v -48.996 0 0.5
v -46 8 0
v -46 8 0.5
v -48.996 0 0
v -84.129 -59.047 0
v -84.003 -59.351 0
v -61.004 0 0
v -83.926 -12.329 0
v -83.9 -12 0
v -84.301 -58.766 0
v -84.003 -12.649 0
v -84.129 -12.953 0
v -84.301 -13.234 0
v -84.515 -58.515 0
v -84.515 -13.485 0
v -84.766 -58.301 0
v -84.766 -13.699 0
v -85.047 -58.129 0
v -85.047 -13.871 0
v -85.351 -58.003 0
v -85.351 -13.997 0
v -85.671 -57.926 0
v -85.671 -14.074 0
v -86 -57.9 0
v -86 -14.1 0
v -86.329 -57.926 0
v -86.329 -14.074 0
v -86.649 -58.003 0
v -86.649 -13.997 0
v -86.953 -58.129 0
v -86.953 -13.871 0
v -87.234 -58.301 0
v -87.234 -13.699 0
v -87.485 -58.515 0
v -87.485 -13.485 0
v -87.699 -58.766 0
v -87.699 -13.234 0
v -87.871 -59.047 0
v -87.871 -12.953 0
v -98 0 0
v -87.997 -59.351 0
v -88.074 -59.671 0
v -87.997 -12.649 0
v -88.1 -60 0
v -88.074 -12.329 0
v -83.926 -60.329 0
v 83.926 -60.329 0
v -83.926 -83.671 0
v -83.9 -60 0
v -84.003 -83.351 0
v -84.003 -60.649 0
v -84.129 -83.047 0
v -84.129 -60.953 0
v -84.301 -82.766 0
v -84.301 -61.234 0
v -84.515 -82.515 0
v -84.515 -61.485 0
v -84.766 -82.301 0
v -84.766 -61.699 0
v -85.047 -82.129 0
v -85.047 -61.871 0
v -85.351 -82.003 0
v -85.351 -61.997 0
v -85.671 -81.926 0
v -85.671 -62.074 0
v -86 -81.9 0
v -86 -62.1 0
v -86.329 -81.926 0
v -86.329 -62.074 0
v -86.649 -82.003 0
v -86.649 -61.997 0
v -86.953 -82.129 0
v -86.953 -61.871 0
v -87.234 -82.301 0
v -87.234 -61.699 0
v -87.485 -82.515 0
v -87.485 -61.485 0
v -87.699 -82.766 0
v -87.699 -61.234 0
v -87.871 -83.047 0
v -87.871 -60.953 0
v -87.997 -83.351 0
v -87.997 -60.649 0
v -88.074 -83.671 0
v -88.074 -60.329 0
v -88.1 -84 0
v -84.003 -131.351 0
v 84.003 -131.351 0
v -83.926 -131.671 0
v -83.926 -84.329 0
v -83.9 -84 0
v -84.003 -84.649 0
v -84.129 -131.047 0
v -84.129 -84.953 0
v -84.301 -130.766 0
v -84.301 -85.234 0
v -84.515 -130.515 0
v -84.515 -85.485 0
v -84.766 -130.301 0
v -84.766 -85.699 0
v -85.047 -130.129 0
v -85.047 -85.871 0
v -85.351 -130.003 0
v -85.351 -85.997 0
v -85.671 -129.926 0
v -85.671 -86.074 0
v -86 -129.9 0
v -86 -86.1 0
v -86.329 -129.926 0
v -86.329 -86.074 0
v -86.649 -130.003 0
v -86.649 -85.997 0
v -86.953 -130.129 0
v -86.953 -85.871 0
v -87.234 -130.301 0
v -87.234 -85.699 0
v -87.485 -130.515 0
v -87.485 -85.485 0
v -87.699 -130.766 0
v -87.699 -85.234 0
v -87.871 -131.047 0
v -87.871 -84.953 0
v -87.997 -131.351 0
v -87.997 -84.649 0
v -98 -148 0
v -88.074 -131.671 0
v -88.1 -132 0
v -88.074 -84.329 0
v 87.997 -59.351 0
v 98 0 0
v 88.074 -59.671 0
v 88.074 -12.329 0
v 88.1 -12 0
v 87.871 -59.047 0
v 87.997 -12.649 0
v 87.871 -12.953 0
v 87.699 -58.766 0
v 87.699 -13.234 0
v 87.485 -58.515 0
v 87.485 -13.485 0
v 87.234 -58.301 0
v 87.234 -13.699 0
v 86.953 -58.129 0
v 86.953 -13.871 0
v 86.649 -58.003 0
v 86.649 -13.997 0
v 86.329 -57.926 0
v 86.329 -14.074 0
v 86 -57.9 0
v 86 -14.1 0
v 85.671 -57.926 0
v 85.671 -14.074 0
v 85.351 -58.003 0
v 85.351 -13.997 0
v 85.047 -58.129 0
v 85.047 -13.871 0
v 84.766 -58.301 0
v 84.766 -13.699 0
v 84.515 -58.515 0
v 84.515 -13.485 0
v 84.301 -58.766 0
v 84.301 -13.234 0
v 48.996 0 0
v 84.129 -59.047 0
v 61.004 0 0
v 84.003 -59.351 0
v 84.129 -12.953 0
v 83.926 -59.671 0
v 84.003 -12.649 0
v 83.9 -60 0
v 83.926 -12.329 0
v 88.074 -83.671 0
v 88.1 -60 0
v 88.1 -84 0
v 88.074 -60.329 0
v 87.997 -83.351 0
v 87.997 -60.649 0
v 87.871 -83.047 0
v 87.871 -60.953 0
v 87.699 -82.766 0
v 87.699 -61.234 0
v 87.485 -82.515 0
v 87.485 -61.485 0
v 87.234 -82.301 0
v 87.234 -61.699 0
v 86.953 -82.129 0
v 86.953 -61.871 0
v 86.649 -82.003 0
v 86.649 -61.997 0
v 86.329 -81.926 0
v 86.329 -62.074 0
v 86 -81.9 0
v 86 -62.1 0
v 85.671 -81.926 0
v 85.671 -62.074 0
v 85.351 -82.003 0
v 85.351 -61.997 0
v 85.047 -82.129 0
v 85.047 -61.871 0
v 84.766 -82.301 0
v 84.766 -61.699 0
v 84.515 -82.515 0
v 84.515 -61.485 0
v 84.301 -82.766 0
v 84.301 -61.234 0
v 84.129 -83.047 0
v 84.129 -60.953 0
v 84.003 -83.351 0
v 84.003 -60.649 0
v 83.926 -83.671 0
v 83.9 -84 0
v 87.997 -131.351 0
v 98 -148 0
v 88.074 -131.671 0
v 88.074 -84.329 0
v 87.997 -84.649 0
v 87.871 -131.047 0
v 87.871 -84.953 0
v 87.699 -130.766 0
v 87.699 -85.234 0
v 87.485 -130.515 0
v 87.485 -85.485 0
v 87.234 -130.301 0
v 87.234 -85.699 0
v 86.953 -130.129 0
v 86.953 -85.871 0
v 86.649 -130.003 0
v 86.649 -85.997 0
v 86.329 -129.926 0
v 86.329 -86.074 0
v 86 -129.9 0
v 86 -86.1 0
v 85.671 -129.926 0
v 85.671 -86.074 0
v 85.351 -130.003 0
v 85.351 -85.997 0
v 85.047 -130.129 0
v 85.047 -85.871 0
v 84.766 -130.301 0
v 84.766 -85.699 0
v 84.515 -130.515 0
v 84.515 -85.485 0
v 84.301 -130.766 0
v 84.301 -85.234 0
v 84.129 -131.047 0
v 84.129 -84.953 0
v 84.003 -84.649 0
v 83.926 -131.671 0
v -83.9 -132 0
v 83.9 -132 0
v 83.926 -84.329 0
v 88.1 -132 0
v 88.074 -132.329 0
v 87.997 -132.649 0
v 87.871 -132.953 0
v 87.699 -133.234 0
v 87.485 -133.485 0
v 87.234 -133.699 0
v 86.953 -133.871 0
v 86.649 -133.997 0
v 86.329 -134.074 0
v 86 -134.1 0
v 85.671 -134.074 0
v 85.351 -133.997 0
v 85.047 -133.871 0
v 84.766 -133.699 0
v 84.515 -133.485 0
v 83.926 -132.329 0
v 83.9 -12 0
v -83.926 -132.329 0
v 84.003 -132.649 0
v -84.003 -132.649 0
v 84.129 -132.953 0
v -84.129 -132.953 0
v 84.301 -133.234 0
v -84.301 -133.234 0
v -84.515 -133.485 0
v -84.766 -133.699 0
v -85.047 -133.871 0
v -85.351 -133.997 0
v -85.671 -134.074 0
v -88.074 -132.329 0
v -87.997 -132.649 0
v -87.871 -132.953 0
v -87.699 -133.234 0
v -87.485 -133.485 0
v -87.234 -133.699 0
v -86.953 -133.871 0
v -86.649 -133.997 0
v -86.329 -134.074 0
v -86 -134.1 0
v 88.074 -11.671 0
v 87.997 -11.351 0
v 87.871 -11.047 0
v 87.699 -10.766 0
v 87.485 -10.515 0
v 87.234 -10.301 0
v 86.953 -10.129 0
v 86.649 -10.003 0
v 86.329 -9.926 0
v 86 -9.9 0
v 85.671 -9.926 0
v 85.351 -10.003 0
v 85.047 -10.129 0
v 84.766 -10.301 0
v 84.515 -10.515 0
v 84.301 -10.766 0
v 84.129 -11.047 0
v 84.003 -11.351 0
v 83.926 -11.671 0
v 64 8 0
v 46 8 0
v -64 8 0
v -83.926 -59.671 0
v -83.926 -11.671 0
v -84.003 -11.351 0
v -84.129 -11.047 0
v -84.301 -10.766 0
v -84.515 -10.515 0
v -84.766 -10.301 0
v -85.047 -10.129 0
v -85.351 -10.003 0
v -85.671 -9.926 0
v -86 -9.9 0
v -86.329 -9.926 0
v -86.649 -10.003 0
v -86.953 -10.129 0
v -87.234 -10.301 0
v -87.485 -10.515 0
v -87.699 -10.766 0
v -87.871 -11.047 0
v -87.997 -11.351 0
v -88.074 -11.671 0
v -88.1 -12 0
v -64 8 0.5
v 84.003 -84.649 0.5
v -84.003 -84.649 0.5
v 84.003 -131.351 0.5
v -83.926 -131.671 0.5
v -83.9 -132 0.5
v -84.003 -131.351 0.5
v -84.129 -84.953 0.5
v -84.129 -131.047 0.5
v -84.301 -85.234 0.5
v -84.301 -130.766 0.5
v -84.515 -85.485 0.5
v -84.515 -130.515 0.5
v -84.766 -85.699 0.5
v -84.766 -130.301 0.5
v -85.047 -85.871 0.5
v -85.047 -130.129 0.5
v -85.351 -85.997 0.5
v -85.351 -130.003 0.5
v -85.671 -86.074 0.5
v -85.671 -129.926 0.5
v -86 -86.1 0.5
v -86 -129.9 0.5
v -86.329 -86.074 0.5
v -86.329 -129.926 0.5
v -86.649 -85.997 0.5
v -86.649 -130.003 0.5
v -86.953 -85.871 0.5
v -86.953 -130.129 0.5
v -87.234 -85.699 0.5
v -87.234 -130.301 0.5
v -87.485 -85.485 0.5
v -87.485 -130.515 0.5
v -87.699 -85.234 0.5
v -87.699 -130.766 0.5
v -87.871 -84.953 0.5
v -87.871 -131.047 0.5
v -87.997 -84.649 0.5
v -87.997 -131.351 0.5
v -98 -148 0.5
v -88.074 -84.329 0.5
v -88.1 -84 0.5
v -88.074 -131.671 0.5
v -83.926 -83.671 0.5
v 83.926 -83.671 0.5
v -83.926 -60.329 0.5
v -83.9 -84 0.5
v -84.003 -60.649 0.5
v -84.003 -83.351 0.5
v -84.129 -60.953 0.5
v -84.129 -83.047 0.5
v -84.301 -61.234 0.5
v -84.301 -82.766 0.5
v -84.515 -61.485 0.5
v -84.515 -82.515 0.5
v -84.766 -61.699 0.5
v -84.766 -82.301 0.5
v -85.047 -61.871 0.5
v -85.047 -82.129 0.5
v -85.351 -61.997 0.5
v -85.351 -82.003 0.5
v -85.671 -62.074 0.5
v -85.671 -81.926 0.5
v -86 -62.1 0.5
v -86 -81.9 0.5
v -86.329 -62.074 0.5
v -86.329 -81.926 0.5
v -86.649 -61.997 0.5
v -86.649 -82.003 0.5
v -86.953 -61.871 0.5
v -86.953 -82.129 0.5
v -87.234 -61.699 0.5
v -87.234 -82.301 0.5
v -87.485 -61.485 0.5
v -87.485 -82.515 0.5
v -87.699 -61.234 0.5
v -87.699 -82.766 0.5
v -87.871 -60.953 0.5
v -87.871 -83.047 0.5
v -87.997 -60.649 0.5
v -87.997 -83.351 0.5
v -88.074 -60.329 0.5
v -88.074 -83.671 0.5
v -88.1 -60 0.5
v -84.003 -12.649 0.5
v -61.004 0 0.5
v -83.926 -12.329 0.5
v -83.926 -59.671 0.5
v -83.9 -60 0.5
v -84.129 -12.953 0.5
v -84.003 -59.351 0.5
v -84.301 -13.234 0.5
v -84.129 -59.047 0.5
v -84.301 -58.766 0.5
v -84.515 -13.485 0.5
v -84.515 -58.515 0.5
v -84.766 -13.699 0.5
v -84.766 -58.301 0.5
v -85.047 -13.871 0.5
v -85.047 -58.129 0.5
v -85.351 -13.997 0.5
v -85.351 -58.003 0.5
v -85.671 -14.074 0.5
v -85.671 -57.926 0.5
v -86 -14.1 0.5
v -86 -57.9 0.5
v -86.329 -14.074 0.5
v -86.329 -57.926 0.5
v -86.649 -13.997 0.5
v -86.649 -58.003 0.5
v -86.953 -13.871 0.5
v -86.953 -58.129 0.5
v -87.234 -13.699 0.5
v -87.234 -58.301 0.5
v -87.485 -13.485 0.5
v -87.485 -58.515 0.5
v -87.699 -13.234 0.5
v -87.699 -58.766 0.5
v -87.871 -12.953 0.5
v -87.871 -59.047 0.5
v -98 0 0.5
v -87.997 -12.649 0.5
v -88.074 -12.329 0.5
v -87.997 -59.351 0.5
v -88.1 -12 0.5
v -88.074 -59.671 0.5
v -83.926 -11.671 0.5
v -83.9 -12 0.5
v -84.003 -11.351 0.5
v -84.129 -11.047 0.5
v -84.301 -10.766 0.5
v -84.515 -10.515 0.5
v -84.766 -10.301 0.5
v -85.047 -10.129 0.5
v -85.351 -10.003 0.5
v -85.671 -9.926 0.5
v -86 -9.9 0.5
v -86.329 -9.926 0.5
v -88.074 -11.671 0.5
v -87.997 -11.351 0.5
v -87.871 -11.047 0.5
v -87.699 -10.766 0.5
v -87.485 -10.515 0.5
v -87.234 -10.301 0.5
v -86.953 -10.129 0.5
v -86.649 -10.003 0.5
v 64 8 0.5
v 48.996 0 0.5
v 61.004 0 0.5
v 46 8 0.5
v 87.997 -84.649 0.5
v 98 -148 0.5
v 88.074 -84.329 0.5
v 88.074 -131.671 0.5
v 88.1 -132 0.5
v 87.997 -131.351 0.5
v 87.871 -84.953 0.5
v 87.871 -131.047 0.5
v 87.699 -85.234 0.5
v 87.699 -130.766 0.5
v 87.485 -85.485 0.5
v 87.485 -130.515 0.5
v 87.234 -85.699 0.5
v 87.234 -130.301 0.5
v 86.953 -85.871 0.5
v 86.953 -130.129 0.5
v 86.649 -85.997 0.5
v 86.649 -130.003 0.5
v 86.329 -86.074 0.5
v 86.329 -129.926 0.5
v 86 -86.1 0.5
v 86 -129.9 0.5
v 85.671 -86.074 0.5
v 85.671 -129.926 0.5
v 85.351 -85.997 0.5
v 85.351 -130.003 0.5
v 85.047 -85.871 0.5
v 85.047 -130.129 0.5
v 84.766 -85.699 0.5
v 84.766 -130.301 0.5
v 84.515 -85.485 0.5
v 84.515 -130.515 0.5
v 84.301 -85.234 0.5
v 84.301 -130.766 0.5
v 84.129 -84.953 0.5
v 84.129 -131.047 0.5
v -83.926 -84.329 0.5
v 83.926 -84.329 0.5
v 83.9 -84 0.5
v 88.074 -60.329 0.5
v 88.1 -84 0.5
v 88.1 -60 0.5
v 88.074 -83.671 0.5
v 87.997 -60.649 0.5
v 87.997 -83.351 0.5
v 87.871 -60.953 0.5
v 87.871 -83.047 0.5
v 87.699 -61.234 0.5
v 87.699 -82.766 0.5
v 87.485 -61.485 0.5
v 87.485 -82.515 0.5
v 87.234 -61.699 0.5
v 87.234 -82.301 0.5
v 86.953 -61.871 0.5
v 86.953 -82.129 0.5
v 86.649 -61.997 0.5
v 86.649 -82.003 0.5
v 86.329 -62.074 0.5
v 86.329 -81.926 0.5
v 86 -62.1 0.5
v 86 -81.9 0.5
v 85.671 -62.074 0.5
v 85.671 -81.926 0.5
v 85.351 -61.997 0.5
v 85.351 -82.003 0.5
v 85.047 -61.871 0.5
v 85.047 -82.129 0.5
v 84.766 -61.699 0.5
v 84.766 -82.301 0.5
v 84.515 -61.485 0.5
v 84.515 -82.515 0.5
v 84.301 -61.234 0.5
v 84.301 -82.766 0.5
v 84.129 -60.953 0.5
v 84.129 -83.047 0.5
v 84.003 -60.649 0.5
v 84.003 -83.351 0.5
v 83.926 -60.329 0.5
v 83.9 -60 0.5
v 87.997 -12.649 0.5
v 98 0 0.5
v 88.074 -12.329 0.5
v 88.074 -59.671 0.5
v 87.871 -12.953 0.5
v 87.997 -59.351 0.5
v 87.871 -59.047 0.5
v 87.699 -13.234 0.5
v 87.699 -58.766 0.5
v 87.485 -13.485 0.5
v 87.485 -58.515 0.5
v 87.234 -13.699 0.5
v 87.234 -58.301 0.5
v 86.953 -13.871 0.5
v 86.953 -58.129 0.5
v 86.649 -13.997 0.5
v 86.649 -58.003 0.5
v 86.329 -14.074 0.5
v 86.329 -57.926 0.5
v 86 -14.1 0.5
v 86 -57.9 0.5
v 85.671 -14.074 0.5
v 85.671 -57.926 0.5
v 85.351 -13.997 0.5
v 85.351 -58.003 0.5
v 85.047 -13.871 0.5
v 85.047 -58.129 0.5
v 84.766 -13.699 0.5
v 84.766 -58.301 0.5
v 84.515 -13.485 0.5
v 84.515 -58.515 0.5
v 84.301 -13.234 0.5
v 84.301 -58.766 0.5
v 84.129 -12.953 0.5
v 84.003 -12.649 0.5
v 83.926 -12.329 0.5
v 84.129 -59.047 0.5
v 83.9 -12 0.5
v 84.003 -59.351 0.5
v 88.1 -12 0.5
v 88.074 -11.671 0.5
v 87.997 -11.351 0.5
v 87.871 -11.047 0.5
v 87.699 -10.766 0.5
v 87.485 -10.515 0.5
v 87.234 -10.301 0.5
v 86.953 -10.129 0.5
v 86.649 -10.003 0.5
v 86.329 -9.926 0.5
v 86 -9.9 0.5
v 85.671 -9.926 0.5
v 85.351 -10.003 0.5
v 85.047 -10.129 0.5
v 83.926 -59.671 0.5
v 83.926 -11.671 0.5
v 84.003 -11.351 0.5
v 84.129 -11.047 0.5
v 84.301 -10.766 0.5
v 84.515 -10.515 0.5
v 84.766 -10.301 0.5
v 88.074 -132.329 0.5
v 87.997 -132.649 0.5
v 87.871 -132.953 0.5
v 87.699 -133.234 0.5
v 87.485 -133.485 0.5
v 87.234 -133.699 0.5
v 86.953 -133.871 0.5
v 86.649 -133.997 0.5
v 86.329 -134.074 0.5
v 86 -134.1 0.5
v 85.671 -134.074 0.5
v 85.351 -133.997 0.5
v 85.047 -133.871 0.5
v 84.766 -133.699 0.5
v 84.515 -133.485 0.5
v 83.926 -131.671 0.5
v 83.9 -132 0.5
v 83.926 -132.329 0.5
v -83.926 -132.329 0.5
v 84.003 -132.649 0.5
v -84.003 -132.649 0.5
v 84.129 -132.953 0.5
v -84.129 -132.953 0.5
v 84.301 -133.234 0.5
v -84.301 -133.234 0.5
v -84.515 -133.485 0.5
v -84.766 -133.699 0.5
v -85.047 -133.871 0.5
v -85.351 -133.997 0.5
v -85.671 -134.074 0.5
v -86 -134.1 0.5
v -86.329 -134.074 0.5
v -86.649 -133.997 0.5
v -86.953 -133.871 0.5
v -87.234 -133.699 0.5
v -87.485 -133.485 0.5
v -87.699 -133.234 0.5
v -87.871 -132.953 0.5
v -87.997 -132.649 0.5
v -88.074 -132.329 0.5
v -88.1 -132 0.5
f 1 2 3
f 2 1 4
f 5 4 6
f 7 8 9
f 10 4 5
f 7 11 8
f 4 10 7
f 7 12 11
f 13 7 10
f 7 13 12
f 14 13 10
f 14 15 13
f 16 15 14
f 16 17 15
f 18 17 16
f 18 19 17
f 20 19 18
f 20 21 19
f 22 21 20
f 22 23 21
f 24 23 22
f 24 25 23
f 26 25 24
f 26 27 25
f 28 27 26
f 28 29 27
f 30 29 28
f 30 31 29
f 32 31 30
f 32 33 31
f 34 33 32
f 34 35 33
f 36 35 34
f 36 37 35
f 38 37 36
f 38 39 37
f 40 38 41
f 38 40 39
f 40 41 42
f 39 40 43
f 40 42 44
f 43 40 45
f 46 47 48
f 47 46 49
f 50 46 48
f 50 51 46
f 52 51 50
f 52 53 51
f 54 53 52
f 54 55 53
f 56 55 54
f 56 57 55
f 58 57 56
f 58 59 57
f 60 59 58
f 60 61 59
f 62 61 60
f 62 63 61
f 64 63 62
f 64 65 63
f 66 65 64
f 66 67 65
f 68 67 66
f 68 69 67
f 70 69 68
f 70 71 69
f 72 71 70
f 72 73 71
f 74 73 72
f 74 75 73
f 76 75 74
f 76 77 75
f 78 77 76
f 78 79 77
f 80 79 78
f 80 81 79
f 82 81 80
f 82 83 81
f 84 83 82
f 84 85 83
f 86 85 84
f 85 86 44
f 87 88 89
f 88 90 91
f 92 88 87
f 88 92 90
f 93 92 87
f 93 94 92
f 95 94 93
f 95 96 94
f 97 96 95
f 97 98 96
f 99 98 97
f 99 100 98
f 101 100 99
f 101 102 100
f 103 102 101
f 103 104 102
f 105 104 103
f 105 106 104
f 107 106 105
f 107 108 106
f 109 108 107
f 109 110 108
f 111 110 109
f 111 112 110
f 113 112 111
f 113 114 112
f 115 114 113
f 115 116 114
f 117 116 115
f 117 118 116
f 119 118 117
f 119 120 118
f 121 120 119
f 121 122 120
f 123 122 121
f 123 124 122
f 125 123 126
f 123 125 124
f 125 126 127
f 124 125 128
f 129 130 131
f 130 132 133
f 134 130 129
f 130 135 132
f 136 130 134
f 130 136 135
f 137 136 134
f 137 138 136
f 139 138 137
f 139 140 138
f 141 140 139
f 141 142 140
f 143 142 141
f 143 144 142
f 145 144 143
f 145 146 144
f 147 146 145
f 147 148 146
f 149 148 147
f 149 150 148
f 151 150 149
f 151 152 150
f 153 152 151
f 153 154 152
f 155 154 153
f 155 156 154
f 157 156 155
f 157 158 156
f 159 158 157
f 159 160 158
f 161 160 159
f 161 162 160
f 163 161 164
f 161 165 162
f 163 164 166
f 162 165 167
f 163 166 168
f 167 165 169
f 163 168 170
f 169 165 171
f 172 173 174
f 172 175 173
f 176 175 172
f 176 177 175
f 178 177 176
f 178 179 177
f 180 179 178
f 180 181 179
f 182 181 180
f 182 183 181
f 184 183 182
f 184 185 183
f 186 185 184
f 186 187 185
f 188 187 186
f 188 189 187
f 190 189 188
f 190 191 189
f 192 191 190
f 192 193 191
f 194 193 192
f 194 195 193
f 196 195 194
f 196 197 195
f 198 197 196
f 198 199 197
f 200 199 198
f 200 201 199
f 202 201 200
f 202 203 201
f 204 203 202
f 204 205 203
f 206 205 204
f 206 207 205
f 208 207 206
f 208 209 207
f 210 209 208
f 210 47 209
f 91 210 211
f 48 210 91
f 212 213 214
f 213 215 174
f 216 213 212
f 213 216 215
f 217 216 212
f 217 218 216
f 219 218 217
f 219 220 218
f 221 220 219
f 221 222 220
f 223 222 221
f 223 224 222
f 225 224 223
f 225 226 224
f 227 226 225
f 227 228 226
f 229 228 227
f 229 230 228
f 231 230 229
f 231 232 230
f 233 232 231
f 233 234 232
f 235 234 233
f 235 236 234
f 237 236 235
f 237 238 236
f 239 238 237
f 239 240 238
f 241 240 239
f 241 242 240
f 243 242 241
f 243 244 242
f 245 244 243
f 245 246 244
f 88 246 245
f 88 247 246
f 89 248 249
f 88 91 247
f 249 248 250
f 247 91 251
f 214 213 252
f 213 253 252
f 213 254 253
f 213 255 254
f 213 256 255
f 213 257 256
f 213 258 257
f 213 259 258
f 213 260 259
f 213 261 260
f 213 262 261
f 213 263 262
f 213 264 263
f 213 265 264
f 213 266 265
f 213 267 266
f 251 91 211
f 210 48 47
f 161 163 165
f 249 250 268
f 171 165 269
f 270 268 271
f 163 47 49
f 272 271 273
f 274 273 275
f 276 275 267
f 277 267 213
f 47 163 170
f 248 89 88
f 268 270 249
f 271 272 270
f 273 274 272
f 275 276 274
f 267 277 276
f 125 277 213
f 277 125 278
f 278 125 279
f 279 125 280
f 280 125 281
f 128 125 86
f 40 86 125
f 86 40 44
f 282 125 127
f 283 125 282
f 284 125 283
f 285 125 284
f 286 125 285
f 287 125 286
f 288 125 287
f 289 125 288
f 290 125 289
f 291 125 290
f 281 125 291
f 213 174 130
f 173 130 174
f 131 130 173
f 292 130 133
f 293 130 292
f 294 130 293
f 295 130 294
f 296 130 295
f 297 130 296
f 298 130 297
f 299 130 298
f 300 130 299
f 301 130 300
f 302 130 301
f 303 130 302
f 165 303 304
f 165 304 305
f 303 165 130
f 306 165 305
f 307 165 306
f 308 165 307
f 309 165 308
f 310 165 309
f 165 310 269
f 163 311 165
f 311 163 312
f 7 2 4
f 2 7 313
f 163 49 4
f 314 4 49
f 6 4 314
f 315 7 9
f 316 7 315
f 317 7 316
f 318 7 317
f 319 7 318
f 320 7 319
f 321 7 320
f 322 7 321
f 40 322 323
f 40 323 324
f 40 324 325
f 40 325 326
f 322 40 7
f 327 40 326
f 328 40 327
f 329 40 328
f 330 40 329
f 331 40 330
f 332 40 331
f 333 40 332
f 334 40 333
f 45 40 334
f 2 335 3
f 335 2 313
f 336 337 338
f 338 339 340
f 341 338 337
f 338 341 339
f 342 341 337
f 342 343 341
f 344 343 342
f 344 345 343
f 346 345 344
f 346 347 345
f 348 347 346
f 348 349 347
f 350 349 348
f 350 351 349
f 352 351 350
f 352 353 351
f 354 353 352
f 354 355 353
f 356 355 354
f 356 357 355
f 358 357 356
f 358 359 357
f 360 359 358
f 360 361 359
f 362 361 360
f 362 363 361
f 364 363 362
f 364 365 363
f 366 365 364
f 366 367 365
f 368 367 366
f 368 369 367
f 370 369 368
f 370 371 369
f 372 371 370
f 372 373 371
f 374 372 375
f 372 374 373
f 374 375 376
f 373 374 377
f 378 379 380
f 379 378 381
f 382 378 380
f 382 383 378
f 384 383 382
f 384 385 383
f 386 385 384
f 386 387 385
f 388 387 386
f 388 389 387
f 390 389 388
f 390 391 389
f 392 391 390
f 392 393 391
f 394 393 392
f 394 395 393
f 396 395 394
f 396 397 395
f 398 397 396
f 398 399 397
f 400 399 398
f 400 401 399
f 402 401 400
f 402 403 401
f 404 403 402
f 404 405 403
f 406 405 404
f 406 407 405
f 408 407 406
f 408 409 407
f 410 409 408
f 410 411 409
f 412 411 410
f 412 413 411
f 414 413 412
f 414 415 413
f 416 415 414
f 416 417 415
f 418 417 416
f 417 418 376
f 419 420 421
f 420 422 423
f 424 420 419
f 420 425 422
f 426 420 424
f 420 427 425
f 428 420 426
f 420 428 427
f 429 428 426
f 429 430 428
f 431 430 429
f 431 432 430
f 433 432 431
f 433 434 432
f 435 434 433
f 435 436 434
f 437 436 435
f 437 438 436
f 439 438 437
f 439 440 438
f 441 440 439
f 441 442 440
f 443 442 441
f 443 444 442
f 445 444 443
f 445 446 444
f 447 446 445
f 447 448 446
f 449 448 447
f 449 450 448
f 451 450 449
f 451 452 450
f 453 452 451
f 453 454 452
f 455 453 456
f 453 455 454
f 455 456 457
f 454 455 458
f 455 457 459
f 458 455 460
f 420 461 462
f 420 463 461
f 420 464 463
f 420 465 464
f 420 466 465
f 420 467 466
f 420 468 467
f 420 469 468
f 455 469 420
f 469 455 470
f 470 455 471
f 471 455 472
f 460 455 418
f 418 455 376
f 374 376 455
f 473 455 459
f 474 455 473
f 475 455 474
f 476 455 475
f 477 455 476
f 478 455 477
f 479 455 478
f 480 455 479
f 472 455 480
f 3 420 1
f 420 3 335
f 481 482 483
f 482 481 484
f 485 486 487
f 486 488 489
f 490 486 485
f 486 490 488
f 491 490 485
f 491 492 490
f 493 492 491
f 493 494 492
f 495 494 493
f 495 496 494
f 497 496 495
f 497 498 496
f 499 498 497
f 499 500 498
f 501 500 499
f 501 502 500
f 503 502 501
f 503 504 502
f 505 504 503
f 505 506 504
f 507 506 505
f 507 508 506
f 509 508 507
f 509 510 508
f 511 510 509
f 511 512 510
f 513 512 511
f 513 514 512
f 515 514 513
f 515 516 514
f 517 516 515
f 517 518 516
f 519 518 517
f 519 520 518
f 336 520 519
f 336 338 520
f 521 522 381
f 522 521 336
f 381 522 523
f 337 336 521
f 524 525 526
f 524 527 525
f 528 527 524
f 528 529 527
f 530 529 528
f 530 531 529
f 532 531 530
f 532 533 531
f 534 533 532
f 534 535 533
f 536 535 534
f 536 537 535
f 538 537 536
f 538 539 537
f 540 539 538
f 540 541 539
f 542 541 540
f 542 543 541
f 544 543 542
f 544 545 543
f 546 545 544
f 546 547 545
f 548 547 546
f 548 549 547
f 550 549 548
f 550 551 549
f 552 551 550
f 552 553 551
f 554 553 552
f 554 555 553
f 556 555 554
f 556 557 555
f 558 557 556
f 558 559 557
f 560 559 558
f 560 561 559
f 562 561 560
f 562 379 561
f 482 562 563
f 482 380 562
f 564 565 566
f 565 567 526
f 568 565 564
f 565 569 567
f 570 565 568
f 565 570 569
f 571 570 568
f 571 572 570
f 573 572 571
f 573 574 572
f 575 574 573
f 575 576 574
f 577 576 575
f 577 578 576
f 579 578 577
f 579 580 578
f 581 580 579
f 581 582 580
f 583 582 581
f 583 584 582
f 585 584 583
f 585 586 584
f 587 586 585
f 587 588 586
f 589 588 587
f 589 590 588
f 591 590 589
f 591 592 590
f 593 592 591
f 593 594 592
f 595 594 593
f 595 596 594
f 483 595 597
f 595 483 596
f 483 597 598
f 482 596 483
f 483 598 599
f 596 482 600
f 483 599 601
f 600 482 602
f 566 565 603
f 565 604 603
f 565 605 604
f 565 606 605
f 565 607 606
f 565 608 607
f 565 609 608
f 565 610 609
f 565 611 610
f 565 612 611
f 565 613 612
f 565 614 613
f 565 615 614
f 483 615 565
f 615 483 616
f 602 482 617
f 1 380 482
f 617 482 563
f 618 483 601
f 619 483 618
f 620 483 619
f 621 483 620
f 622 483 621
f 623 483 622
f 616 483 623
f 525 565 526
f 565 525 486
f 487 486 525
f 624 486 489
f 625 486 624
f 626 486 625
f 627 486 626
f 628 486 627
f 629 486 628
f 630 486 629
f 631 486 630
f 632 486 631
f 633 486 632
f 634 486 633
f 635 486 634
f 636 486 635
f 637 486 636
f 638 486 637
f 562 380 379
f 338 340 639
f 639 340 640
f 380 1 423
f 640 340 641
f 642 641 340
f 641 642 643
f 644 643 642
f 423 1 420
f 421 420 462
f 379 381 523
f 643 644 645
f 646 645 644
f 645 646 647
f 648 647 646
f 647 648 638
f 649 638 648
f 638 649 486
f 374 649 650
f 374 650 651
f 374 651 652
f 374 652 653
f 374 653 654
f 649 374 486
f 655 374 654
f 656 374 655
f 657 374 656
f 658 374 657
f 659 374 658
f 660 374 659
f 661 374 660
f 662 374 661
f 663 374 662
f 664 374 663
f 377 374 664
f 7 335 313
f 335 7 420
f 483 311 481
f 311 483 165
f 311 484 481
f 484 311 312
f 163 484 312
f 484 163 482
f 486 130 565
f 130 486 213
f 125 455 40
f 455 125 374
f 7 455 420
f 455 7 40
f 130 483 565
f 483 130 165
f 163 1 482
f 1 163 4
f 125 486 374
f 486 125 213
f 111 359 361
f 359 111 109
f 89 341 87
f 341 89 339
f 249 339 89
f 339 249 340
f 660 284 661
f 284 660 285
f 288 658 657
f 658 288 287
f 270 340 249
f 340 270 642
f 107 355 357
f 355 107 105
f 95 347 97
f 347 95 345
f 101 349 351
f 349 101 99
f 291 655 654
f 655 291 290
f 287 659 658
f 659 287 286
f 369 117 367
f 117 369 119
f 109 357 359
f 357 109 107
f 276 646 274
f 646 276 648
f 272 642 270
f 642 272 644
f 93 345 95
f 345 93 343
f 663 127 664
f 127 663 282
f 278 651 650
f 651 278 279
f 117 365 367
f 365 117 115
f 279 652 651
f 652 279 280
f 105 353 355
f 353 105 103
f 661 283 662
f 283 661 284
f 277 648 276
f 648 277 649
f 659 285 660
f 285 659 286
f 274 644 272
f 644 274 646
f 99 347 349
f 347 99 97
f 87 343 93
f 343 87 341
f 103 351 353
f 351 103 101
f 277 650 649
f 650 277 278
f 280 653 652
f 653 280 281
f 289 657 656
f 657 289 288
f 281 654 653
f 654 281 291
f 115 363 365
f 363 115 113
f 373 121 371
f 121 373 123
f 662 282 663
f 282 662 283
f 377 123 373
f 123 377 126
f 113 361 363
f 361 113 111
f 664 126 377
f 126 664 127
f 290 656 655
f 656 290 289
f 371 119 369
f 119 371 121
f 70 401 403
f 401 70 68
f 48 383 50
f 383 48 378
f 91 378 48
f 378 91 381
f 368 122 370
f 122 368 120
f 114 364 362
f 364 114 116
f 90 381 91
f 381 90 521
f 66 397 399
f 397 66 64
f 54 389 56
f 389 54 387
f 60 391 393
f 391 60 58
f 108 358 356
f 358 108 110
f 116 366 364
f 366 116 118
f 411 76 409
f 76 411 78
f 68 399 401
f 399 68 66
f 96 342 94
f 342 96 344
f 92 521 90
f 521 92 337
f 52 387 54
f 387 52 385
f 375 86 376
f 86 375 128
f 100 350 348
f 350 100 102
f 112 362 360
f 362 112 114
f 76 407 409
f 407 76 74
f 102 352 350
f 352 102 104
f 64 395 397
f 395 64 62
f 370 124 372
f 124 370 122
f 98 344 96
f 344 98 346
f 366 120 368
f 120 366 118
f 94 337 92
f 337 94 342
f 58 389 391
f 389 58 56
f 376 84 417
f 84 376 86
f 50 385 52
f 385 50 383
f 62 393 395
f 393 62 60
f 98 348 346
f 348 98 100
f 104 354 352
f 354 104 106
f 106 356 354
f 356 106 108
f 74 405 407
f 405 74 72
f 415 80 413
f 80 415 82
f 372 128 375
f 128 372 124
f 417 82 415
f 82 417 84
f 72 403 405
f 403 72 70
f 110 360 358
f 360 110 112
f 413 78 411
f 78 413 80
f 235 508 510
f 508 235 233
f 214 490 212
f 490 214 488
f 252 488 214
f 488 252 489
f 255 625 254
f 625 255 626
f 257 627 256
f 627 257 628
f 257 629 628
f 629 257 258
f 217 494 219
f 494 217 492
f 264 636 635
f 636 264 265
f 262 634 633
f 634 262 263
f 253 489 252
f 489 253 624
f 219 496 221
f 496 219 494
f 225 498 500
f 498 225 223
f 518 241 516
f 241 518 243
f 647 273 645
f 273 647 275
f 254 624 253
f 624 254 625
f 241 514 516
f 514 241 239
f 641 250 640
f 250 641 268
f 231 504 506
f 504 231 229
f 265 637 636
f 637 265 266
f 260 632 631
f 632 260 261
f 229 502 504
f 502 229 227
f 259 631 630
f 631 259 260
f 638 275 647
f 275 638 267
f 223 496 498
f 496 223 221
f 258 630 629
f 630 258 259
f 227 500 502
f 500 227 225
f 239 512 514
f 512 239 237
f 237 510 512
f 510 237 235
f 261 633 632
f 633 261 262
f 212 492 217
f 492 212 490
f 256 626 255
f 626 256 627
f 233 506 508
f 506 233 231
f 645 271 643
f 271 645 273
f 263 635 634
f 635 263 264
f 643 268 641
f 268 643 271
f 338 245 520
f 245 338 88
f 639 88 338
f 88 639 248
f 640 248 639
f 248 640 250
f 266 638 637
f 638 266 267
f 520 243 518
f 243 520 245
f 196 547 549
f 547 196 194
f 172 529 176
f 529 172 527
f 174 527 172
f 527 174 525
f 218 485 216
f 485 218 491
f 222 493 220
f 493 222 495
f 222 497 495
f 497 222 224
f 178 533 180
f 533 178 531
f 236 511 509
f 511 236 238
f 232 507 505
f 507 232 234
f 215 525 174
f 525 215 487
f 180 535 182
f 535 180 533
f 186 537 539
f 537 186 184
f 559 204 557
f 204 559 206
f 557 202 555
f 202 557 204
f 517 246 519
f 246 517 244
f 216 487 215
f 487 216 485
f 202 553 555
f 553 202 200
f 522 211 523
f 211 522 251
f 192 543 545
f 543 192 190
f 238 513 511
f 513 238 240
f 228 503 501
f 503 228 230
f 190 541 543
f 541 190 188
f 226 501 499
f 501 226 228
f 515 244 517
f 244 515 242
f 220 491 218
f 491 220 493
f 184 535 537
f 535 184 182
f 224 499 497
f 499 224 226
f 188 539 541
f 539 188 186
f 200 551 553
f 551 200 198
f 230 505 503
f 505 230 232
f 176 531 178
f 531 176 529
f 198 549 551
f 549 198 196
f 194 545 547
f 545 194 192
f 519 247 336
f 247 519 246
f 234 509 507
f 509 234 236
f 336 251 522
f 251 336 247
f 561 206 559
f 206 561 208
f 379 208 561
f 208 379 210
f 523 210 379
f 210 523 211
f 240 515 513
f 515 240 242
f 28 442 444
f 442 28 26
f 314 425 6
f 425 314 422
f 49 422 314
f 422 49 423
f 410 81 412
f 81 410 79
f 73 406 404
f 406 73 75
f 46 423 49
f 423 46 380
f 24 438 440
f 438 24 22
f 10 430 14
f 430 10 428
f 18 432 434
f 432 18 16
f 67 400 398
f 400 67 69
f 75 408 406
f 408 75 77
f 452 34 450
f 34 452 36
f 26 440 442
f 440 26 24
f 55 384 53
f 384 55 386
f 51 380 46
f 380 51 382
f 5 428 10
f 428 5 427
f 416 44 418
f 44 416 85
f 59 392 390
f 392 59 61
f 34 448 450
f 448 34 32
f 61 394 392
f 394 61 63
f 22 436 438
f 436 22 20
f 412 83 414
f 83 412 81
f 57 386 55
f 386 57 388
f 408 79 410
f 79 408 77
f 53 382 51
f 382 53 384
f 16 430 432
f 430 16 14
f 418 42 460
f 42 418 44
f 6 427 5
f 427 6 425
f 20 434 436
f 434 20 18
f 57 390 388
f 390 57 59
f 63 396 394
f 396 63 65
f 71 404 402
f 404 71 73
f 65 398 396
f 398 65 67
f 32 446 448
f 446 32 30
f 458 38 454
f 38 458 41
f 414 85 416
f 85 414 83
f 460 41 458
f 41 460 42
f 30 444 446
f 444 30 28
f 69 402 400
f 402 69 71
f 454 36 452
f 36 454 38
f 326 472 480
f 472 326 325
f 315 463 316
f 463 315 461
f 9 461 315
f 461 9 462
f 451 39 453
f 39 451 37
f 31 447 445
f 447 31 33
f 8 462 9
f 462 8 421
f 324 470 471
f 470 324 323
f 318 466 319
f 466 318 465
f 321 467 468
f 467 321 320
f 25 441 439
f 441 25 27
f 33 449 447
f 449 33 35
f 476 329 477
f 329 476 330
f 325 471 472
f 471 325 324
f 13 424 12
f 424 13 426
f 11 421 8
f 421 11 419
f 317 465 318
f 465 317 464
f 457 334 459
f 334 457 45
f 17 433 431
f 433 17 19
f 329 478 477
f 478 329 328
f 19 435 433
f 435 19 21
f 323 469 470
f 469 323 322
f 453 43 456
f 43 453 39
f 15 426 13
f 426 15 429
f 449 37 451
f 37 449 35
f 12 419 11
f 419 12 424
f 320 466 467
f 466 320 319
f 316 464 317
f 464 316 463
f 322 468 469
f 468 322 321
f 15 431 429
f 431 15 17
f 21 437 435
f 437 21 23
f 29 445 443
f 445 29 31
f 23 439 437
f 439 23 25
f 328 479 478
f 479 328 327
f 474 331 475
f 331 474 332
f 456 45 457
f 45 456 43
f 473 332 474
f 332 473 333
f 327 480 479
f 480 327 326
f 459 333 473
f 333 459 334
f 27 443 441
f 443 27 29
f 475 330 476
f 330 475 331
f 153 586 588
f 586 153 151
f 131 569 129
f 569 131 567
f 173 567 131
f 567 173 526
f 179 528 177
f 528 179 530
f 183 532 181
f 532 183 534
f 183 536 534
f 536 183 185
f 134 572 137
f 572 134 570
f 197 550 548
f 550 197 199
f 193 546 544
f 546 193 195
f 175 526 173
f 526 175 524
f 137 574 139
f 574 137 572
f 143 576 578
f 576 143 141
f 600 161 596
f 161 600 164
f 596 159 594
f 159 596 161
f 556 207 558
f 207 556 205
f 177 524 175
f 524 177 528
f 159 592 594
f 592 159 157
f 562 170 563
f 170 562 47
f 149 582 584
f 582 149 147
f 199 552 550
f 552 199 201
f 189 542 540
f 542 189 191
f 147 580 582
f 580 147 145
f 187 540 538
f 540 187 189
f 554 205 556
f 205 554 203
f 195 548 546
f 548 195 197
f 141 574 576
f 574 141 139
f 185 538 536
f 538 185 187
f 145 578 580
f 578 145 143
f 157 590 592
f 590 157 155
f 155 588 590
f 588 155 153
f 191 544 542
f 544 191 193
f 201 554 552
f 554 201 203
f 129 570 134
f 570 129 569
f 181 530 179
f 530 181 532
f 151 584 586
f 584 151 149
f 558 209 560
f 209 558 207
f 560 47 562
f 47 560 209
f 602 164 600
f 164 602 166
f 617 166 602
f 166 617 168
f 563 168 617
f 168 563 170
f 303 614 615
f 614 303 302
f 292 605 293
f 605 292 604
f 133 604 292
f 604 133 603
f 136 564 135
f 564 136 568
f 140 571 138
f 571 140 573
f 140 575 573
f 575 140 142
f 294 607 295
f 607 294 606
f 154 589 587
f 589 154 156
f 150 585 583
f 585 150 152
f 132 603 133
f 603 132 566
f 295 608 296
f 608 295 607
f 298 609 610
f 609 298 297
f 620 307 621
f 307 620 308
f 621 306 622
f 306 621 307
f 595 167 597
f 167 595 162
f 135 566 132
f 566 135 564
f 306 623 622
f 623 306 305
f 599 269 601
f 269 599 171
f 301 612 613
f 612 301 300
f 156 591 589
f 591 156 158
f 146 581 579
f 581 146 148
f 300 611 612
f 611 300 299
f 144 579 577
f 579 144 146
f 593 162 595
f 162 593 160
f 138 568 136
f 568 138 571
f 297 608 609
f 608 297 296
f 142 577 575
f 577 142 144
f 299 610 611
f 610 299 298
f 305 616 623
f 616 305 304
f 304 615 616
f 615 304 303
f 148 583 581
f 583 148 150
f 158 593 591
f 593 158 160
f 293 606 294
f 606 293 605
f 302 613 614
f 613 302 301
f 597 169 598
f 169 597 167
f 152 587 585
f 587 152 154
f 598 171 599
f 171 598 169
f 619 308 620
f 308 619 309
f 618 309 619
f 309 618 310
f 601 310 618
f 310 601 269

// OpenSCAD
include <../lib/filament-spool-roller-lib.scad>;
$fn = 40;
floor_template_left();
